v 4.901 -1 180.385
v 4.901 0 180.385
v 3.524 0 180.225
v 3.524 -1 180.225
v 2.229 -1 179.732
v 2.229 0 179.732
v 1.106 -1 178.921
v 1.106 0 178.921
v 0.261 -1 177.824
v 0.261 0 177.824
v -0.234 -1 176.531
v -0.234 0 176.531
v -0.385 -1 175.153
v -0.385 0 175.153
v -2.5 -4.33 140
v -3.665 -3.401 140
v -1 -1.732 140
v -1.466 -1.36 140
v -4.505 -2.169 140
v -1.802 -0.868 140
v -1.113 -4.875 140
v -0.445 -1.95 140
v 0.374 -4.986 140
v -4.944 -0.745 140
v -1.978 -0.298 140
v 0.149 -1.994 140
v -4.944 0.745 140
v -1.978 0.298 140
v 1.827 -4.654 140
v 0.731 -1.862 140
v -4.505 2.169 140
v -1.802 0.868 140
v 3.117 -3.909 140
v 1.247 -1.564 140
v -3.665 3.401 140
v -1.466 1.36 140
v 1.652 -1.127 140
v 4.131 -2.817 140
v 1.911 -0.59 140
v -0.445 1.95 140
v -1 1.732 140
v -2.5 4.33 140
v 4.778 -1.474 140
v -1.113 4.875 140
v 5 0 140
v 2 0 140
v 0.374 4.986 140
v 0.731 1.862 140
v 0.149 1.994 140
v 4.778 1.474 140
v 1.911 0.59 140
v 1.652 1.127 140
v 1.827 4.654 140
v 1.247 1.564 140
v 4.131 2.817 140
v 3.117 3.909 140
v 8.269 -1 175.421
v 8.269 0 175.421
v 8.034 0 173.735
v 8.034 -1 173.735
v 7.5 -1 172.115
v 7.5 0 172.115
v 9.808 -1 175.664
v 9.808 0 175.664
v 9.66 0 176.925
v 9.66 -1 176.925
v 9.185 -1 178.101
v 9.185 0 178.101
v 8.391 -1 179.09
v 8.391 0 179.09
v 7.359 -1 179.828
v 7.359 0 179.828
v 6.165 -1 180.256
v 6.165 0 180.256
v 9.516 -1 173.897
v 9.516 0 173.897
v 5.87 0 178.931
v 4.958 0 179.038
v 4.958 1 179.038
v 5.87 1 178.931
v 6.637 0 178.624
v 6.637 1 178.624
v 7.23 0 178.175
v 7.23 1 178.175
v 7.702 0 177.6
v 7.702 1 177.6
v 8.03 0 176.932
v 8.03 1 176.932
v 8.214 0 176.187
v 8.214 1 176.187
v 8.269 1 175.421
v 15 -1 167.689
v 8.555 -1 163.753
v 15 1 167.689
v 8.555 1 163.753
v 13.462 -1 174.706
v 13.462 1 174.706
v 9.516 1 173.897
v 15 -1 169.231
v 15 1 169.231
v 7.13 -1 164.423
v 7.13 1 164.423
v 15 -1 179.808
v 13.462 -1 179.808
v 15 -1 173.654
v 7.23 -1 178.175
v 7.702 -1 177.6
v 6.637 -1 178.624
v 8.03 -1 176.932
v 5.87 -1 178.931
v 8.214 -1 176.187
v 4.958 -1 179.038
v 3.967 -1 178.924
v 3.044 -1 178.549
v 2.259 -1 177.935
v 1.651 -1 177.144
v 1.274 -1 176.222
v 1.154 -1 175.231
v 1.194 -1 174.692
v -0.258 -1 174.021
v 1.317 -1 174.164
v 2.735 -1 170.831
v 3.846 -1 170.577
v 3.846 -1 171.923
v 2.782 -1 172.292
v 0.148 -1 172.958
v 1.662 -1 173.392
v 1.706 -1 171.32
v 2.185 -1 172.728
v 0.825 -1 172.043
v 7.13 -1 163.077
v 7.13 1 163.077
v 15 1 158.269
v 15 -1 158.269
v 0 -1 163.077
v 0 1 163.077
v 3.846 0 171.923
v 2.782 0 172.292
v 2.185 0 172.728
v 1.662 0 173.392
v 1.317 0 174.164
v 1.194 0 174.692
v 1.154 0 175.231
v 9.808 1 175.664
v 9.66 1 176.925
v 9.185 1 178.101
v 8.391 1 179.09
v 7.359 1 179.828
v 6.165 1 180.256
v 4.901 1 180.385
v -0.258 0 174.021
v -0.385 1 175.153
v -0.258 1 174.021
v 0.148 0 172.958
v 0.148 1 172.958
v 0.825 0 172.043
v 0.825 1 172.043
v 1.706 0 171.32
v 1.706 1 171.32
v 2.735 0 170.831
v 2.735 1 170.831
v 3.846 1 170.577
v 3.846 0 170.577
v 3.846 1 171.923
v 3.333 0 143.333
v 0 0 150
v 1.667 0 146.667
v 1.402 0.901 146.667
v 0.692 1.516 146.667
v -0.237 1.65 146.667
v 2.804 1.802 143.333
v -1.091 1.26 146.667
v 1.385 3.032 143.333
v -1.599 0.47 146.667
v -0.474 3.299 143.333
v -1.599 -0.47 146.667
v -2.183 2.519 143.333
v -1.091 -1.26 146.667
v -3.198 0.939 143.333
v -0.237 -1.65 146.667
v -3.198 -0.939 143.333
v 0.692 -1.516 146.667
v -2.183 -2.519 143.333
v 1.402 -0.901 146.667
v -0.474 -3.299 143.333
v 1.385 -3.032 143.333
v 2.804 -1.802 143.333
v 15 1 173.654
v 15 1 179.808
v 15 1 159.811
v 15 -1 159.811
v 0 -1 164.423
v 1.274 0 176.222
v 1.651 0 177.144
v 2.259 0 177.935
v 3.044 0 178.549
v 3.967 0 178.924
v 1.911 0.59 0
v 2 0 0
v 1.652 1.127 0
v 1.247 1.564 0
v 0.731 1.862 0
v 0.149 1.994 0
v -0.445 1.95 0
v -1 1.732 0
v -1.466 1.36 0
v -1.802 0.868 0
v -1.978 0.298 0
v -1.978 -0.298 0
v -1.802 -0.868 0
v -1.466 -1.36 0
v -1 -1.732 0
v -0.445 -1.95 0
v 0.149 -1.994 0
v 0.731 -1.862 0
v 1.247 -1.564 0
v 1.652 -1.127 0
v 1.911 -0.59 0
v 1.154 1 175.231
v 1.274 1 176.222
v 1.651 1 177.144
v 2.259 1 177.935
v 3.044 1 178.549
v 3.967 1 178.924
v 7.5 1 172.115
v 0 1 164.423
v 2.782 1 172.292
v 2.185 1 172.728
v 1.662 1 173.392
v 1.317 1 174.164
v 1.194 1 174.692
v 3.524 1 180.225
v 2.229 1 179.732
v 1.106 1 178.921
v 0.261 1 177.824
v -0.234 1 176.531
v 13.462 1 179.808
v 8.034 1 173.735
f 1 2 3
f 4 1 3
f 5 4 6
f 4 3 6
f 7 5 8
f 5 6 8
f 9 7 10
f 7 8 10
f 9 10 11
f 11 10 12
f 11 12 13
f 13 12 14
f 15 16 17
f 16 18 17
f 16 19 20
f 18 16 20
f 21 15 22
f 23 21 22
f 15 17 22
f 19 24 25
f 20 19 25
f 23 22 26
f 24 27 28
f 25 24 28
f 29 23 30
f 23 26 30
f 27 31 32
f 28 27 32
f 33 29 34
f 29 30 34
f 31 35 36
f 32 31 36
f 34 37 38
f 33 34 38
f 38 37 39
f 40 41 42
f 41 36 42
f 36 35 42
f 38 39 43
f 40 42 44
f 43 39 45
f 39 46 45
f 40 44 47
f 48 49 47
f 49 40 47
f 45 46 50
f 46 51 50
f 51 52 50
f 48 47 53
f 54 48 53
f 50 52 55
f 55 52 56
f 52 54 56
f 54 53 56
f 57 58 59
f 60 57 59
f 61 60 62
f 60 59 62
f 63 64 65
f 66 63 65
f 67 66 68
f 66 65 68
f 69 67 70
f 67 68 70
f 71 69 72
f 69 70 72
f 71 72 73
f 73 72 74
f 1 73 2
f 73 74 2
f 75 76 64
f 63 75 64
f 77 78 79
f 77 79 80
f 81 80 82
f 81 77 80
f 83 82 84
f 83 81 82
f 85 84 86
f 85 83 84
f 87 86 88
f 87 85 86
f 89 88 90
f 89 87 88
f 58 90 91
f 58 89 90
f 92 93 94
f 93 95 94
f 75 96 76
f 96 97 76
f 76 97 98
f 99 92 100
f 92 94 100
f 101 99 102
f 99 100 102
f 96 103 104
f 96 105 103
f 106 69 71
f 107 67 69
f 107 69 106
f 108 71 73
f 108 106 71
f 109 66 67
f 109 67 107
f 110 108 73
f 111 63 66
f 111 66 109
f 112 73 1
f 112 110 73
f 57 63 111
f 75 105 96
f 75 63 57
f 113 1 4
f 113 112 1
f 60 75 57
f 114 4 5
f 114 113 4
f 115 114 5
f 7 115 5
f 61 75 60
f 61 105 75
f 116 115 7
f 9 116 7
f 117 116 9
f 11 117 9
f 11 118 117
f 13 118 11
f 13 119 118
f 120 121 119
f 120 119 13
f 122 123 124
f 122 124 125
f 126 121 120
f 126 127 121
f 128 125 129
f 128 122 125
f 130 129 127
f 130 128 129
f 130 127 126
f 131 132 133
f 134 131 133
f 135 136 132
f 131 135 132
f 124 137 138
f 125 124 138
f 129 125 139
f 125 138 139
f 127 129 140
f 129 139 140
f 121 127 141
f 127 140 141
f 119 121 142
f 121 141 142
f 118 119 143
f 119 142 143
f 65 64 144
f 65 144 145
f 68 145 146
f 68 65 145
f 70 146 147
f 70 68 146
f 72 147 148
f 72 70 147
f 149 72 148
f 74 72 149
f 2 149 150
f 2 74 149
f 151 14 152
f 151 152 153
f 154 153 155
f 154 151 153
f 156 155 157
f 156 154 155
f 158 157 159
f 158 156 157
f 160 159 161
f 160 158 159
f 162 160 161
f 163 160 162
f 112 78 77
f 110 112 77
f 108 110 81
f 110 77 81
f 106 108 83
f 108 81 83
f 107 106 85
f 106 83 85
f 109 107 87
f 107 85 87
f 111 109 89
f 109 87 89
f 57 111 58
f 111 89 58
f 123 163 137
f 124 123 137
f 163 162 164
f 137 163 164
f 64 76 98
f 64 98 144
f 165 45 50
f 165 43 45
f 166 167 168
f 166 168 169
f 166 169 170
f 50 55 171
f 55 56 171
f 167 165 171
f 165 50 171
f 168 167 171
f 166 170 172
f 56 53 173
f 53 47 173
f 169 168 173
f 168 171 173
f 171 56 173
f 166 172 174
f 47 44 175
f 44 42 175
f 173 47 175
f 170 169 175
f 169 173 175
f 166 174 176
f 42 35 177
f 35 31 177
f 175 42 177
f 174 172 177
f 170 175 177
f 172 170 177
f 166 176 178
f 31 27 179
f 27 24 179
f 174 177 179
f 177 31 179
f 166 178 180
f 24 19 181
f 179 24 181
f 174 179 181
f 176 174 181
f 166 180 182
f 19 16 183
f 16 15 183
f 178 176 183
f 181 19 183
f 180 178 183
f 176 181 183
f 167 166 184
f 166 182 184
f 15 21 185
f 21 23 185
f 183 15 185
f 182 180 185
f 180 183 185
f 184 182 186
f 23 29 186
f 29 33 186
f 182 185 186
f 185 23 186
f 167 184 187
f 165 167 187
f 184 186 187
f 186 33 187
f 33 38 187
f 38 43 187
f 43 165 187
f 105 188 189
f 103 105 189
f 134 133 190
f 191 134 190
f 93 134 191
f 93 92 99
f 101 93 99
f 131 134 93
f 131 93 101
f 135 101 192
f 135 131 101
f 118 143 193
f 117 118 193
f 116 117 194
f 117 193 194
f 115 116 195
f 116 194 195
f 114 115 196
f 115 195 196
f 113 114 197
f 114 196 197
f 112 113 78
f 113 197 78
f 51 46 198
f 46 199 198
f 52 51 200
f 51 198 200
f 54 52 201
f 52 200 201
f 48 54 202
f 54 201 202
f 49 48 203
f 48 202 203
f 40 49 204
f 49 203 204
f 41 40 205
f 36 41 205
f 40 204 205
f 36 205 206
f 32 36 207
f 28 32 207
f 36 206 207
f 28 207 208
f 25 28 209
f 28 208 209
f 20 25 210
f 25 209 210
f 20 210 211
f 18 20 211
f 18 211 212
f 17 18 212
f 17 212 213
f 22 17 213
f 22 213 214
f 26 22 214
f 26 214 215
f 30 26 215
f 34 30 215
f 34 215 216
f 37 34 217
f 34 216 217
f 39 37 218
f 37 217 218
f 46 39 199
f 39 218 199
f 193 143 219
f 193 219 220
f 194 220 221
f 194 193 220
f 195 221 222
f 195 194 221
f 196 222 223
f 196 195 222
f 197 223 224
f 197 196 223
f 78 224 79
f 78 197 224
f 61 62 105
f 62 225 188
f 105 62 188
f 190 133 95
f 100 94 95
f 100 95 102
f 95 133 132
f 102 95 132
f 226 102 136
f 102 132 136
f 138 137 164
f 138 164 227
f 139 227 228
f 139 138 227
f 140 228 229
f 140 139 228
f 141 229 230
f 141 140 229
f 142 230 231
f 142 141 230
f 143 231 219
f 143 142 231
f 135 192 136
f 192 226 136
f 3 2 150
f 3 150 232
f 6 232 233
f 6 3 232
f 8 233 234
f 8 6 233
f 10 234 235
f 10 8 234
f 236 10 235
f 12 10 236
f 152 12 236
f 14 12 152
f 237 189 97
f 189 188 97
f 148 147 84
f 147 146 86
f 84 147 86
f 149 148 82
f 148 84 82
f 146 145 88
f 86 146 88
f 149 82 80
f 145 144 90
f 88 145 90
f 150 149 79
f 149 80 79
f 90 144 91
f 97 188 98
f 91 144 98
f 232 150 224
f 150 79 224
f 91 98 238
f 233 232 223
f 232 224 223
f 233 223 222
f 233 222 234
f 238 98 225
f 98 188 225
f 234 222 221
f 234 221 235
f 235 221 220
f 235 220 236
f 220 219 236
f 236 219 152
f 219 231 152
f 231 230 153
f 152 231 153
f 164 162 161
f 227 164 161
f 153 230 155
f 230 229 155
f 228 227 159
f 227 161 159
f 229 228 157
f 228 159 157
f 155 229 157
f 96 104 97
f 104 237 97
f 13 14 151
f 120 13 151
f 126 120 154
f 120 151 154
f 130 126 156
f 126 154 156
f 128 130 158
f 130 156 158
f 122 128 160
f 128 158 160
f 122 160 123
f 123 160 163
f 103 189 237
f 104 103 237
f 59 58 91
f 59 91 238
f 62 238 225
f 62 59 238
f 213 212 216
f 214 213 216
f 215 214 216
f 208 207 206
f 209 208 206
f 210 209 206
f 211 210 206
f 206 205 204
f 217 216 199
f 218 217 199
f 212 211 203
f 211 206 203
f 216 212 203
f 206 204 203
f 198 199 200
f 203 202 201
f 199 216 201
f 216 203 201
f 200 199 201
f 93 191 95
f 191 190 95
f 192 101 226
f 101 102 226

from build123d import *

# Parameters (mm, degrees)
BOSS_EXTRUDE1_DEPTH        = 1
BOSS_EXTRUDE1_DEPTH_BACK   = 1
BOSS_EXTRUDE1_2_DEPTH      = 1
BOSS_EXTRUDE1_2_DEPTH_BACK = 1


with BuildPart() as part:
    # Sketch2 → Revolve1 (revolve)
    with BuildSketch(Plane(origin=(0, 0, 0), x_dir=(1, 0, 0), z_dir=(0, 1, 0))):
        Polygon((0, -150), (5, -140), (2, -140), (2, 0), (0, 0), align=None)
    revolve(axis=Axis((0, 0, -41.949952025), (0, 0, 1)))


with BuildPart() as body_2:
    # Sketch3 → Boss-Extrude1 (new, two sides: drawn at the far end of the back side and taken through both)
    with BuildSketch(Plane(origin=(0, 0, 0), x_dir=(1, 0, 0), z_dir=(0, 1, 0)).offset(-BOSS_EXTRUDE1_DEPTH_BACK)):
        Polygon((15, -158.269230769), (15, -159.810697115), (8.5546875, -163.753004808), (15, -167.689302885), (15, -169.230769231), (7.130408654, -164.423076923), (0, -164.423076923), (0, -163.076923077), (7.130408654, -163.076923077), align=None)
    extrude(amount=BOSS_EXTRUDE1_DEPTH + BOSS_EXTRUDE1_DEPTH_BACK)


with BuildPart() as body_3:
    # Sketch3 → Boss-Extrude1 2 (new, two sides: drawn at the far end of the back side and taken through both)
    with BuildSketch(Plane(origin=(0, 0, 0), x_dir=(1, 0, 0), z_dir=(0, 1, 0)).offset(-BOSS_EXTRUDE1_2_DEPTH_BACK)):
        with BuildLine():
            Line((15, -179.807692308), (13.461538462, -179.807692308))
            Line((13.461538462, -179.807692308), (13.461538462, -174.705528846))
            Line((13.461538462, -174.705528846), (9.516225962, -173.897235577))
            add(Edge.make_bspline(
                [(9.516225962, -173.897235577), (9.560069984, -174.056046467), (9.645010842, -174.363717449), (9.739321287, -174.817831139), (9.79617319, -175.248940583), (9.803935949, -175.52869217), (9.807692308, -175.6640625)],
                knots=[0, 0, 0, 0, 1.100273476, 2.13160584, 3.095893838, 4, 4, 4, 4], degree=3))
            add(Edge.make_bspline(
                [(9.807692308, -175.6640625), (9.80406592, -175.831563664), (9.796935536, -176.160912801), (9.728498237, -176.642802217), (9.620706778, -177.102770502), (9.470367987, -177.540031781), (9.27688397, -177.955527868), (9.038322224, -178.346938443), (8.756332859, -178.71648177), (8.433636595, -179.059272633), (8.078046752, -179.36977016), (7.69696552, -179.643847295), (7.29004627, -179.87179102), (6.859088372, -180.059323742), (6.40481492, -180.208112848), (5.923863394, -180.30741536), (5.420501794, -180.373464937), (5.07634109, -180.380849655), (4.900841346, -180.384615385)],
                knots=[0, 0, 0, 0, 1.052772836, 2.070014431, 3.053871312, 4.019926262, 4.972333346, 5.930471369, 6.896690565, 7.89035727, 8.885779078, 9.861050232, 10.836829716, 11.812751485, 12.812646763, 13.836748493, 14.896881366, 16, 16, 16, 16], degree=3))
            add(Edge.make_bspline(
                [(4.900841346, -180.384615385), (4.778603099, -180.381765446), (4.535778548, -180.376104083), (4.175162896, -180.347304507), (3.82217058, -180.291886664), (3.476806888, -180.217376289), (3.139533541, -180.121050596), (2.810473221, -180.00317501), (2.488612692, -179.864228754), (2.173930875, -179.707355138), (1.876128909, -179.525881439), (1.590609774, -179.334720075), (1.327881174, -179.1229659), (1.078351765, -178.900871002), (0.851820957, -178.659554718), (0.638594518, -178.406507121), (0.447934566, -178.135789814), (0.272570453, -177.852249643), (0.115556237, -177.556065406), (-0.015421666, -177.244233857), (-0.130224929, -176.923600511), (-0.223583551, -176.591307598), (-0.296016348, -176.247998871), (-0.3453421, -175.89249212), (-0.381230877, -175.526571213), (-0.383479521, -175.278535958), (-0.384615385, -175.153245192)],
                knots=[0, 0, 0, 0, 1.05623316, 2.098192244, 3.122504159, 4.140841222, 5.148757784, 6.150489607, 7.158294732, 8.176043417, 9.185147859, 10.169157858, 11.142149047, 12.097904048, 13.0527185, 13.998867679, 14.954465986, 15.910220987, 16.877849176, 17.847023716, 18.829548819, 19.818454515, 20.826519638, 21.858115382, 22.918063636, 24, 24, 24, 24], degree=3))
            add(Edge.make_bspline(
                [(-0.384615385, -175.153245192), (-0.381654391, -175.003784601), (-0.375828986, -174.709738543), (-0.314896318, -174.278933505), (-0.227608888, -173.864451862), (-0.096359784, -173.46957387), (0.068338734, -173.090967937), (0.275171288, -172.733674031), (0.512831306, -172.390669376), (0.789518858, -172.071276433), (1.094777245, -171.775442729), (1.4224906, -171.506555591), (1.773961963, -171.27074318), (2.146199136, -171.067043165), (2.539842613, -170.893540967), (2.956070317, -170.757174261), (3.392788381, -170.64712876), (3.693445765, -170.600570611), (3.846153846, -170.576923077)],
                knots=[0, 0, 0, 0, 1.046825758, 2.059506013, 3.044032586, 4.011925612, 4.970610144, 5.93275819, 6.900651216, 7.891265644, 8.889116719, 9.876966323, 10.858259055, 11.851035124, 12.847502422, 13.86866322, 14.9174643, 16, 16, 16, 16], degree=3))
            Line((3.846153846, -170.576923077), (3.846153846, -171.923076923))
            add(Edge.make_bspline(
                [(3.846153846, -171.923076923), (3.703098259, -171.956178466), (3.428137478, -172.01980147), (3.04204192, -172.159817802), (2.69668325, -172.329958206), (2.391735429, -172.53687613), (2.12441618, -172.778712967), (1.88413982, -173.052693328), (1.670243081, -173.362720419), (1.490802042, -173.707096607), (1.337990992, -174.070626836), (1.236183362, -174.451045596), (1.164611935, -174.838067395), (1.157446733, -175.099831414), (1.153846154, -175.231370192)],
                knots=[0, 0, 0, 0, 1.136389429, 2.184203582, 3.172920998, 4.111012962, 5.028380909, 5.957351669, 6.927793475, 7.937618031, 8.960409703, 9.974842029, 10.982339866, 12, 12, 12, 12], degree=3))
            add(Edge.make_bspline(
                [(1.153846154, -175.231370192), (1.157363773, -175.359763526), (1.164289995, -175.612571049), (1.217600047, -175.984619849), (1.299703924, -176.343817882), (1.422574731, -176.686620839), (1.571909239, -177.019027437), (1.763545278, -177.332629311), (1.984088214, -177.636498784), (2.236759486, -177.921190785), (2.515201034, -178.181931282), (2.812961292, -178.412314658), (3.13060492, -178.604215716), (3.462632718, -178.765933325), (3.812683677, -178.888733177), (4.179117285, -178.976337382), (4.562838629, -179.027779063), (4.824564242, -179.034855549), (4.957932692, -179.038461538)],
                knots=[0, 0, 0, 0, 1.027316725, 2.022795036, 3.002884548, 3.971462791, 4.93288096, 5.914575861, 6.907176829, 7.935150275, 8.956128384, 9.956726525, 10.942570165, 11.921478529, 12.907843606, 13.90538589, 14.932640048, 16, 16, 16, 16], degree=3))
            add(Edge.make_bspline(
                [(4.957932692, -179.038461538), (5.078329844, -179.036094025), (5.314125191, -179.031457297), (5.657578768, -178.979931878), (5.984910027, -178.90775276), (6.29319175, -178.796930932), (6.58693828, -178.660001159), (6.859862365, -178.486279367), (7.118975898, -178.287697464), (7.353752503, -178.055103129), (7.571902904, -177.801468893), (7.757597535, -177.52090705), (7.913889203, -177.219816997), (8.048747155, -176.901683536), (8.14560886, -176.558978672), (8.218327983, -176.198478299), (8.260393931, -175.816292553), (8.26623058, -175.554989583), (8.269230769, -175.420673077)],
                knots=[0, 0, 0, 0, 1.045726679, 2.048034203, 3.01323695, 3.95502507, 4.889743367, 5.8246644, 6.761650845, 7.722168973, 8.692072792, 9.66525385, 10.638902184, 11.638179751, 12.663148338, 13.728659964, 14.832472288, 16, 16, 16, 16], degree=3))
            add(Edge.make_bspline(
                [(8.269230769, -175.420673077), (8.266827016, -175.30339655), (8.26190616, -175.063313293), (8.223180046, -174.694185696), (8.163603645, -174.307975981), (8.07773504, -173.903184759), (7.970221633, -173.480922911), (7.835950868, -173.040488208), (7.68128788, -172.581870009), (7.561325997, -172.273187122), (7.5, -172.115384615)],
                knots=[0, 0, 0, 0, 0.824638674, 1.688163388, 2.607705698, 3.571998603, 4.597075385, 5.671199175, 6.809488238, 8, 8, 8, 8], degree=3))
            Line((7.5, -172.115384615), (15, -173.653846154))
            Line((15, -173.653846154), (15, -179.807692308))
        make_face()
    extrude(amount=BOSS_EXTRUDE1_2_DEPTH + BOSS_EXTRUDE1_2_DEPTH_BACK)


solid = Compound([part.part, body_2.part, body_3.part])
